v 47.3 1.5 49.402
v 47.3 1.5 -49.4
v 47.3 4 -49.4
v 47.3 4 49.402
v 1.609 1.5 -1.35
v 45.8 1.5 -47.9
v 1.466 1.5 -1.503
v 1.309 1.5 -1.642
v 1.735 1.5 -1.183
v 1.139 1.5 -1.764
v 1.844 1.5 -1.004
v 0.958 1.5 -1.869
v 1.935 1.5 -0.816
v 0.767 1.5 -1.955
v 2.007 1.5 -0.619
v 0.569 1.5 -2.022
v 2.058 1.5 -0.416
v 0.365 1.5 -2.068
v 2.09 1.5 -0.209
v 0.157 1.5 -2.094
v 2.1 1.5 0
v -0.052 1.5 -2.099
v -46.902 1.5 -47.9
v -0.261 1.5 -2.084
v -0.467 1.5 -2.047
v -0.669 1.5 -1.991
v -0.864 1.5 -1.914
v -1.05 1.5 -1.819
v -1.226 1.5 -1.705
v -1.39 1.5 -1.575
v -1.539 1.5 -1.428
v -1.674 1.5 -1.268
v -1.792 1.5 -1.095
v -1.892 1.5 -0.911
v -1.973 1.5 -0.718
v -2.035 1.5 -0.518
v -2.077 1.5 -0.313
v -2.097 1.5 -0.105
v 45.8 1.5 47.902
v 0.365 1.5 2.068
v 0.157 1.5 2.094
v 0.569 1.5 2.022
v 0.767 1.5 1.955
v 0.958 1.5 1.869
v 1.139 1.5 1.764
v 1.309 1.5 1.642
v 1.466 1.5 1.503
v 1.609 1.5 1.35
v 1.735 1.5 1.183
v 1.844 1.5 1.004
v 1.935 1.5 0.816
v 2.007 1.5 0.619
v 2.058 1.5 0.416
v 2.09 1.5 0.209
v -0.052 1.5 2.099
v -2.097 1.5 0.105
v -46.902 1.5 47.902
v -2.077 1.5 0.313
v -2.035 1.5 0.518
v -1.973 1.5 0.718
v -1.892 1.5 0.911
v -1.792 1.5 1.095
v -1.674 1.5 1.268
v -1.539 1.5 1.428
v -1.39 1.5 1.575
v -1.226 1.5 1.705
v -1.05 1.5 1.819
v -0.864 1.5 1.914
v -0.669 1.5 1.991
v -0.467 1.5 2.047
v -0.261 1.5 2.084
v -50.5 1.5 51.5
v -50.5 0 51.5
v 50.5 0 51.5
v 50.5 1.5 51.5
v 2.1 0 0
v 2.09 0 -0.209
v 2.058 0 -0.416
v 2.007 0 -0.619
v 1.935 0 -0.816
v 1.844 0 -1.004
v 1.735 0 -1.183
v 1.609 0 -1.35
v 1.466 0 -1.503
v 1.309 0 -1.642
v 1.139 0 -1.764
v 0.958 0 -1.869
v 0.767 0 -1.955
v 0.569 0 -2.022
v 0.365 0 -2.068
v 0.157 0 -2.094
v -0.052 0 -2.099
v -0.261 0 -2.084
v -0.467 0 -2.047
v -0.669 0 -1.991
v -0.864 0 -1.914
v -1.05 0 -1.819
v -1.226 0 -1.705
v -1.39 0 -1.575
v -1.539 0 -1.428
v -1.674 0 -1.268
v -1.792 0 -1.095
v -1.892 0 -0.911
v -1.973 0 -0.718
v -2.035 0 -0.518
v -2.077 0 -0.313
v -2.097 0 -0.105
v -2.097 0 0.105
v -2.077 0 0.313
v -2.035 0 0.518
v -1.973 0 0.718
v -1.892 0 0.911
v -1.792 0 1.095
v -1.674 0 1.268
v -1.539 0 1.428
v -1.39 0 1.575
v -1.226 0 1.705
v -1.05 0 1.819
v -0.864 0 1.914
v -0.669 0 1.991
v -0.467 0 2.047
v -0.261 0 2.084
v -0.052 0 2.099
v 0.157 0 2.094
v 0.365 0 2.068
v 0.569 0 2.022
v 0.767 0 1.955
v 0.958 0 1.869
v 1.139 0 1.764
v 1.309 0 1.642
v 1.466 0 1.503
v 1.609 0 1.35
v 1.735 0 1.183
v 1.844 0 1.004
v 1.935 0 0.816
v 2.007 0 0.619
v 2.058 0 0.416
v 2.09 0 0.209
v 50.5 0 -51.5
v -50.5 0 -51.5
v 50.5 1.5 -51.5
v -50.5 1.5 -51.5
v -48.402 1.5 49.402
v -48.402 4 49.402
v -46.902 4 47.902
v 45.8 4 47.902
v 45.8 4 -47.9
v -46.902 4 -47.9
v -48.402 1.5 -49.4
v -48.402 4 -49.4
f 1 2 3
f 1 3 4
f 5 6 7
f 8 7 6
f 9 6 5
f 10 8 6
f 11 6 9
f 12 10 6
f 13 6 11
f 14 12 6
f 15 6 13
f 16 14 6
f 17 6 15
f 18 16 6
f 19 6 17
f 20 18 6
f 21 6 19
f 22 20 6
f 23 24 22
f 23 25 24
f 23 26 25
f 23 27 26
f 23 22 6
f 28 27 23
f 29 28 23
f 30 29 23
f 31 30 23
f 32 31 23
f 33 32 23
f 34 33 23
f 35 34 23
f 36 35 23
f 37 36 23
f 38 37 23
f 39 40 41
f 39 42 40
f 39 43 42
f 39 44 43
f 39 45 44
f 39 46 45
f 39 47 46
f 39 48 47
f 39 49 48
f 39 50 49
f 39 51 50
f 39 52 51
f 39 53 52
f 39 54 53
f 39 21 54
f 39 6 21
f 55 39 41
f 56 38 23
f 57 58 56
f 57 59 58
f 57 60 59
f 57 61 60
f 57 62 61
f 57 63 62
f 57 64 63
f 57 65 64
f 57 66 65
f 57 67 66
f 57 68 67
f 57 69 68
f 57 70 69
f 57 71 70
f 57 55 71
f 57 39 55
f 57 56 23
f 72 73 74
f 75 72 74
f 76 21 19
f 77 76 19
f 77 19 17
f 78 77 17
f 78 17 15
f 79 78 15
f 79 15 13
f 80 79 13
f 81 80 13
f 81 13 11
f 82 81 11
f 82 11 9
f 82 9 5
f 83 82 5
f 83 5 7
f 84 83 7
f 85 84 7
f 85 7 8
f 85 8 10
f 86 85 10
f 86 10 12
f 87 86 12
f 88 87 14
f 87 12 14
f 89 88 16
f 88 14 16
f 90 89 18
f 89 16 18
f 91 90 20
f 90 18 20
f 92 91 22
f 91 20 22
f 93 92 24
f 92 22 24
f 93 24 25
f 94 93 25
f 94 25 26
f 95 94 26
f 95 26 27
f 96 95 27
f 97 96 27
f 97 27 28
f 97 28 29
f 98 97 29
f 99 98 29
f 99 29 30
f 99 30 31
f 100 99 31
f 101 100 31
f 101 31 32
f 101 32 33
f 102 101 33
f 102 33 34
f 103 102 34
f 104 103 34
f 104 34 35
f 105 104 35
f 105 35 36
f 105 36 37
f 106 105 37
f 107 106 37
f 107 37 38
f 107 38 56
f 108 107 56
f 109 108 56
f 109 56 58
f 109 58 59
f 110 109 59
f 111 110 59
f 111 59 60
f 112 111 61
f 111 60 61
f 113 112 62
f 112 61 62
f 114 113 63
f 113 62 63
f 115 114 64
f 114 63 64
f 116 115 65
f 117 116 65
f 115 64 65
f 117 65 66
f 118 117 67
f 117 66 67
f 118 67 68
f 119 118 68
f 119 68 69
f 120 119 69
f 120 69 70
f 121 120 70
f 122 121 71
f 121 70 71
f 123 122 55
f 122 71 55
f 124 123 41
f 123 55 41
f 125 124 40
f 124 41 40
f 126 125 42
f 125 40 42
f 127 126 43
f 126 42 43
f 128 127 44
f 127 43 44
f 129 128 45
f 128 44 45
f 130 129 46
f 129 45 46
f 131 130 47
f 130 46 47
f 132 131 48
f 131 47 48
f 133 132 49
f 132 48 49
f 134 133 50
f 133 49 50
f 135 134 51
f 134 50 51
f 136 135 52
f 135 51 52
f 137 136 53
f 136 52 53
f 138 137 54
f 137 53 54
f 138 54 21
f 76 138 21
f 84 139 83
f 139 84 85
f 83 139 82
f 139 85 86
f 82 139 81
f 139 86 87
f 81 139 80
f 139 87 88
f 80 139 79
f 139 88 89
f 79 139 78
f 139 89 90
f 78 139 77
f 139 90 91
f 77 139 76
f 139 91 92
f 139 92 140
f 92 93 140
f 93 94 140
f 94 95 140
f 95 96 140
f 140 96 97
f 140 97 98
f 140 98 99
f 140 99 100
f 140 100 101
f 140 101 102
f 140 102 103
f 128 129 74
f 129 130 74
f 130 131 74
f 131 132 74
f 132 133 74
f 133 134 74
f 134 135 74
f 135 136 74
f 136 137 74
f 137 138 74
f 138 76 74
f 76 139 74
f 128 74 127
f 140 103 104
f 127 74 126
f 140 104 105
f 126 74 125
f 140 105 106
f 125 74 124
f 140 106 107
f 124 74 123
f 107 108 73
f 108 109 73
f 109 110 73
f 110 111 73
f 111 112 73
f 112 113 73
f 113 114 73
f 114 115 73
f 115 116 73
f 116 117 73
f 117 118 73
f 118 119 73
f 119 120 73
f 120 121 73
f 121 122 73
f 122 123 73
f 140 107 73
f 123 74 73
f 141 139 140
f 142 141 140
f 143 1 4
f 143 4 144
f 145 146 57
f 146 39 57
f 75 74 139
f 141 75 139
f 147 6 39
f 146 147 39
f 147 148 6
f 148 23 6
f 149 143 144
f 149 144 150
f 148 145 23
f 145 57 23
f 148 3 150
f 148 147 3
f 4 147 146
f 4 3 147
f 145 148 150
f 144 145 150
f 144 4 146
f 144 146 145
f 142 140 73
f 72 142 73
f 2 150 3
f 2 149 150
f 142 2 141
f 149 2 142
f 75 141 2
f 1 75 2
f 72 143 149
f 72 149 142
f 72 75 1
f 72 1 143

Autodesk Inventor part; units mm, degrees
ref_plane "YZ Plane" through (0, 0, 0) normal (1, 0, 0) x (0, 1, 0)
ref_plane "XZ Plane" through (0, 0, 0) normal (0, 1, 0) x (-1, 0, 0)
ref_plane "XY Plane" through (0, 0, 0) normal (0, 0, 1) x (1, 0, 0)
sketch "Sketch1" plane through (0, 0, 0) normal (0, 1, 0) x (-1, 0, 0)
  line L0 (50.5, 51.5) -> (-50.5, 51.5)
  line L1 (-50.5, 51.5) -> (-50.5, -51.5)
  line L2 (-50.5, -51.5) -> (50.5, -51.5)
  line L3 (50.5, -51.5) -> (50.5, 51.5)
  line L4 (50.5, 51.5) -> (-50.5, -51.5) construction
  line L5 (-50.5, 51.5) -> (50.5, -51.5) construction
  line L6 (48.4022, -49.4) -> (-47.3, -49.4)
  line L7 (-47.3, 49.4022) -> (48.4022, 49.4022)
  line L8 (48.4022, 49.4022) -> (48.4022, -49.4)
  line L9 (-47.3, -47.9892) -> (-47.3, 42.6215)
  line L10 (-47.3, -47.9892) -> (-47.3, -49.4)
  line L11 (-47.3, 42.6215) -> (-47.3, 49.4022)
  line L12 (46.9022, -47.9) -> (-45.8, -47.9)
  line L13 (-45.8, -47.9) -> (-45.8, 42.6215)
  line L14 (-45.8, 42.6215) -> (-45.8, 47.9022)
  line L15 (-45.8, 47.9022) -> (46.9022, 47.9022)
  line L16 (46.9022, 47.9022) -> (46.9022, -47.9)
  point P0 (0, 0)
  dimension "d0" = 101
  dimension "d1" = 103
  dimension "d2" = 2.1
  dimension "d3" = 3.2
  dimension "d4" = 1.5
extrude "Extrusion1" add sketch "Sketch1" along normal blind 1.5 contours L3 L2 L1 L0 | L6 L10 L9 L11 L7 L8 | L12 L13 L14 L15 L16
extrude "Extrusion2" add sketch "Sketch1" along normal blind 4 contours L6 L10 L9 L11 L7 L8
sketch "Sketch2" plane through (0, 1.5, 0) normal (0, 1, 0) x (1, 0, 0)
  circle A0 centre (0, 0) radius 2.1
  dimension "d9" = 4.2
extrude "Extrusion3" cut sketch "Sketch2" against normal blind 4
properties part number "TAPA GENERAL_3DPrint"
